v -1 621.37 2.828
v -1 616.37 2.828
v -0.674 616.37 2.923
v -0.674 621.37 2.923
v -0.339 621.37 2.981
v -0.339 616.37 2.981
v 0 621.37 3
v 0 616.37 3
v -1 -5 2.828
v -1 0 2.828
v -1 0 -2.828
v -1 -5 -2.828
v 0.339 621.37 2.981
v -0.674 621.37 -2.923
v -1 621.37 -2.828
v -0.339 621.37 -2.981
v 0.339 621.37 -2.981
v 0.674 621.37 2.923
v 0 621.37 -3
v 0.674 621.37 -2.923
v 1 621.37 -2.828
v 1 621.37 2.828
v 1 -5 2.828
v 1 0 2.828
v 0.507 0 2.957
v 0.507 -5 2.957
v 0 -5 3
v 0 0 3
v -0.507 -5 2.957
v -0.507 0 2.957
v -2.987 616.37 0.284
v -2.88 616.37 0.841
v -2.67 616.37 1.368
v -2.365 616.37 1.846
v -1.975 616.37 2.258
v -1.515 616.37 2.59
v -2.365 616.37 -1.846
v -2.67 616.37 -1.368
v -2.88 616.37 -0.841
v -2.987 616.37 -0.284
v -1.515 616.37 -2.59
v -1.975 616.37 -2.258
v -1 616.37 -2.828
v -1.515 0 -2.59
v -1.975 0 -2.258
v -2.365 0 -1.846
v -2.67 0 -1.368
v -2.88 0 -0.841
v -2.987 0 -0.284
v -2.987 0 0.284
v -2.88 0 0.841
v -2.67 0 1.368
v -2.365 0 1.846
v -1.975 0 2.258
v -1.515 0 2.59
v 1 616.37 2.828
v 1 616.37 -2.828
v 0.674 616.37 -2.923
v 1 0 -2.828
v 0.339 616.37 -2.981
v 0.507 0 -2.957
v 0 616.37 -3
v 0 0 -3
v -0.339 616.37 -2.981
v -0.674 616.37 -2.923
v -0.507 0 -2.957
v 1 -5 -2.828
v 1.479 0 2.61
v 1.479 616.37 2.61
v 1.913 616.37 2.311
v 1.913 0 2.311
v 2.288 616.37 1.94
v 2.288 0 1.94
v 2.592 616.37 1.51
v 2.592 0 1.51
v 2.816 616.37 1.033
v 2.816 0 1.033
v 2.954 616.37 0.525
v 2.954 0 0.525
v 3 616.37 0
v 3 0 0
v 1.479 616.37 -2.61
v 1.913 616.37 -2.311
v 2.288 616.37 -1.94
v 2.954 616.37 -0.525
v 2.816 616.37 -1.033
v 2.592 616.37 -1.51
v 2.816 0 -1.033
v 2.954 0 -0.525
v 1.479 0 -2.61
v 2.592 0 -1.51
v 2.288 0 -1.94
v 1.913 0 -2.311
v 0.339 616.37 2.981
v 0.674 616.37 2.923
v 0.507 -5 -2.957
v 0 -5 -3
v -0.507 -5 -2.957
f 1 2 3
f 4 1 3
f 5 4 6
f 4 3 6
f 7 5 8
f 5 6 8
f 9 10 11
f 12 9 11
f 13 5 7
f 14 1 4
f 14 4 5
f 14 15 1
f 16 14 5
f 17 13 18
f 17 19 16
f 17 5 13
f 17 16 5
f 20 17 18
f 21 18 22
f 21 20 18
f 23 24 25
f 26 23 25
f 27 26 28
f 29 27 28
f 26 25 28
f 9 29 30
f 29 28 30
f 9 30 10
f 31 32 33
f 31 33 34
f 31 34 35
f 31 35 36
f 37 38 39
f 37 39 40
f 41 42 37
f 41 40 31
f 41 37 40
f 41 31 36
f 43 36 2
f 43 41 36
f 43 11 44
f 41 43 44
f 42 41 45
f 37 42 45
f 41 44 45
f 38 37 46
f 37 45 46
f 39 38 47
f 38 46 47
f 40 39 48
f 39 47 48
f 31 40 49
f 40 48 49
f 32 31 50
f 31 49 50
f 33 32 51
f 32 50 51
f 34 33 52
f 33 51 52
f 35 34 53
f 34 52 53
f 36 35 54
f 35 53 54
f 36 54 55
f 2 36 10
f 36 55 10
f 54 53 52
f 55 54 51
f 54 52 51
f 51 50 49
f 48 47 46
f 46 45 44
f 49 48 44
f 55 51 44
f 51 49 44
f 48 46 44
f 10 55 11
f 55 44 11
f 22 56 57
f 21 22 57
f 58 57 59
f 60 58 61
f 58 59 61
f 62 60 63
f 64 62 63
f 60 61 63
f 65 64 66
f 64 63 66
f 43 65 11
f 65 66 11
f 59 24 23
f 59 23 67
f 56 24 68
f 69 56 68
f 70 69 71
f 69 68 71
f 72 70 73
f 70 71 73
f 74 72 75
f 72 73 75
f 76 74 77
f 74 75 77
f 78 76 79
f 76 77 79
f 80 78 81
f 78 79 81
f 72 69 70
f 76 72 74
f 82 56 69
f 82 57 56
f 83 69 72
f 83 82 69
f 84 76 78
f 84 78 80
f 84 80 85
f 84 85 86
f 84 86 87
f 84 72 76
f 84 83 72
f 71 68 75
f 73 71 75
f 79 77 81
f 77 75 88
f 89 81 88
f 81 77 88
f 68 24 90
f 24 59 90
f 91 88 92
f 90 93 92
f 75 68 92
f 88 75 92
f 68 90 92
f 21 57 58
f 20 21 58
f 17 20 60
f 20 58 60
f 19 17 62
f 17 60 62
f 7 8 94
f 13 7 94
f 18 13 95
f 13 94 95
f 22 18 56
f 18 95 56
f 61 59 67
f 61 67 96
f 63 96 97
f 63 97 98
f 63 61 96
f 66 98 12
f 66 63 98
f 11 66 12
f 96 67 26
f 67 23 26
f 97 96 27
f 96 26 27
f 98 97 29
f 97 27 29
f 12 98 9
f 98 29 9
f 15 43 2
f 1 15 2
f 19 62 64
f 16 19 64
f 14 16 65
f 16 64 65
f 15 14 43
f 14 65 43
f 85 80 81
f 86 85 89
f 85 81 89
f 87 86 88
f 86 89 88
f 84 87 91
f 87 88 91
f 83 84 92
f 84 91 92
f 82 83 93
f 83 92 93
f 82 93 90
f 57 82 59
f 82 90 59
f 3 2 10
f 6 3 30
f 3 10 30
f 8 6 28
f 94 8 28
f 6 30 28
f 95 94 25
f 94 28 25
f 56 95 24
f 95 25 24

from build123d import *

# Parameters (mm, degrees)
SKETCH1_R           = 3
BOSS_EXTRUDE1_DEPTH = 616.37
BOSS_EXTRUDE3_DEPTH = 5
SKETCH4_W           = 2
SKETCH4_H           = 5.65685425
BOSS_EXTRUDE4_DEPTH = 641.64
SKETCH5_W           = 2
SKETCH5_H           = 5.65685425
CUT_EXTRUDE2_DEPTH  = 15.27


with BuildPart() as part:
    # Sketch1 → Boss-Extrude1 (new body)
    with BuildSketch(Plane(origin=(0, 0, 0), x_dir=(1, 0, 0), z_dir=(0, 1, 0))):
        Circle(SKETCH1_R)
    extrude(amount=BOSS_EXTRUDE1_DEPTH)

    # Sketch2 → Boss-Extrude3 (add)
    with BuildSketch(Plane(origin=(0, 616.37, 0), x_dir=(1, 0, 0), z_dir=(0, 1, 0))):
        with BuildLine():
            ThreePointArc((-1, -2.828427125), (-0.507305936, -2.956795679), (0, -3))
            ThreePointArc((0, -3), (0.507305936, -2.956795679), (1, -2.828427125))
            Line((1, -2.828427125), (1, 2.828427125))
            ThreePointArc((1, 2.828427125), (0.507305936, 2.956795679), (0, 3))
            ThreePointArc((0, 3), (-0.507305936, 2.956795679), (-1, 2.828427125))
            Line((-1, 2.828427125), (-1, -2.828427125))
        make_face()
    extrude(amount=BOSS_EXTRUDE3_DEPTH)

    # Sketch4 → Boss-Extrude4 (add)
    with BuildSketch(Plane(origin=(0, 621.37, 0), x_dir=(1, 0, 0), z_dir=(0, 1, 0))):
        Rectangle(SKETCH4_W, SKETCH4_H)
        with BuildLine():
            Line((-1, -2.828427125), (1, -2.828427125))
            ThreePointArc((1, -2.828427125), (0, -3), (-1, -2.828427125))
        make_face()
        with BuildLine():
            Line((-1, 2.828427125), (1, 2.828427125))
            ThreePointArc((1, 2.828427125), (0, 3), (-1, 2.828427125))
        make_face()
    extrude(amount=-BOSS_EXTRUDE4_DEPTH)

    # Sketch5 → Cut-Extrude2 (cut)
    with BuildSketch(Plane.XZ.offset(20.27)):
        with BuildLine():
            Line((-1, -2.828427125), (1, -2.828427125))
            ThreePointArc((1, -2.828427125), (0, -3), (-1, -2.828427125))
        make_face()
        Rectangle(SKETCH5_W, SKETCH5_H)
        with BuildLine():
            Line((-1, 2.828427125), (1, 2.828427125))
            ThreePointArc((1, 2.828427125), (0, 3), (-1, 2.828427125))
        make_face()
    extrude(amount=-CUT_EXTRUDE2_DEPTH, mode=Mode.SUBTRACT)


solid = part.part
